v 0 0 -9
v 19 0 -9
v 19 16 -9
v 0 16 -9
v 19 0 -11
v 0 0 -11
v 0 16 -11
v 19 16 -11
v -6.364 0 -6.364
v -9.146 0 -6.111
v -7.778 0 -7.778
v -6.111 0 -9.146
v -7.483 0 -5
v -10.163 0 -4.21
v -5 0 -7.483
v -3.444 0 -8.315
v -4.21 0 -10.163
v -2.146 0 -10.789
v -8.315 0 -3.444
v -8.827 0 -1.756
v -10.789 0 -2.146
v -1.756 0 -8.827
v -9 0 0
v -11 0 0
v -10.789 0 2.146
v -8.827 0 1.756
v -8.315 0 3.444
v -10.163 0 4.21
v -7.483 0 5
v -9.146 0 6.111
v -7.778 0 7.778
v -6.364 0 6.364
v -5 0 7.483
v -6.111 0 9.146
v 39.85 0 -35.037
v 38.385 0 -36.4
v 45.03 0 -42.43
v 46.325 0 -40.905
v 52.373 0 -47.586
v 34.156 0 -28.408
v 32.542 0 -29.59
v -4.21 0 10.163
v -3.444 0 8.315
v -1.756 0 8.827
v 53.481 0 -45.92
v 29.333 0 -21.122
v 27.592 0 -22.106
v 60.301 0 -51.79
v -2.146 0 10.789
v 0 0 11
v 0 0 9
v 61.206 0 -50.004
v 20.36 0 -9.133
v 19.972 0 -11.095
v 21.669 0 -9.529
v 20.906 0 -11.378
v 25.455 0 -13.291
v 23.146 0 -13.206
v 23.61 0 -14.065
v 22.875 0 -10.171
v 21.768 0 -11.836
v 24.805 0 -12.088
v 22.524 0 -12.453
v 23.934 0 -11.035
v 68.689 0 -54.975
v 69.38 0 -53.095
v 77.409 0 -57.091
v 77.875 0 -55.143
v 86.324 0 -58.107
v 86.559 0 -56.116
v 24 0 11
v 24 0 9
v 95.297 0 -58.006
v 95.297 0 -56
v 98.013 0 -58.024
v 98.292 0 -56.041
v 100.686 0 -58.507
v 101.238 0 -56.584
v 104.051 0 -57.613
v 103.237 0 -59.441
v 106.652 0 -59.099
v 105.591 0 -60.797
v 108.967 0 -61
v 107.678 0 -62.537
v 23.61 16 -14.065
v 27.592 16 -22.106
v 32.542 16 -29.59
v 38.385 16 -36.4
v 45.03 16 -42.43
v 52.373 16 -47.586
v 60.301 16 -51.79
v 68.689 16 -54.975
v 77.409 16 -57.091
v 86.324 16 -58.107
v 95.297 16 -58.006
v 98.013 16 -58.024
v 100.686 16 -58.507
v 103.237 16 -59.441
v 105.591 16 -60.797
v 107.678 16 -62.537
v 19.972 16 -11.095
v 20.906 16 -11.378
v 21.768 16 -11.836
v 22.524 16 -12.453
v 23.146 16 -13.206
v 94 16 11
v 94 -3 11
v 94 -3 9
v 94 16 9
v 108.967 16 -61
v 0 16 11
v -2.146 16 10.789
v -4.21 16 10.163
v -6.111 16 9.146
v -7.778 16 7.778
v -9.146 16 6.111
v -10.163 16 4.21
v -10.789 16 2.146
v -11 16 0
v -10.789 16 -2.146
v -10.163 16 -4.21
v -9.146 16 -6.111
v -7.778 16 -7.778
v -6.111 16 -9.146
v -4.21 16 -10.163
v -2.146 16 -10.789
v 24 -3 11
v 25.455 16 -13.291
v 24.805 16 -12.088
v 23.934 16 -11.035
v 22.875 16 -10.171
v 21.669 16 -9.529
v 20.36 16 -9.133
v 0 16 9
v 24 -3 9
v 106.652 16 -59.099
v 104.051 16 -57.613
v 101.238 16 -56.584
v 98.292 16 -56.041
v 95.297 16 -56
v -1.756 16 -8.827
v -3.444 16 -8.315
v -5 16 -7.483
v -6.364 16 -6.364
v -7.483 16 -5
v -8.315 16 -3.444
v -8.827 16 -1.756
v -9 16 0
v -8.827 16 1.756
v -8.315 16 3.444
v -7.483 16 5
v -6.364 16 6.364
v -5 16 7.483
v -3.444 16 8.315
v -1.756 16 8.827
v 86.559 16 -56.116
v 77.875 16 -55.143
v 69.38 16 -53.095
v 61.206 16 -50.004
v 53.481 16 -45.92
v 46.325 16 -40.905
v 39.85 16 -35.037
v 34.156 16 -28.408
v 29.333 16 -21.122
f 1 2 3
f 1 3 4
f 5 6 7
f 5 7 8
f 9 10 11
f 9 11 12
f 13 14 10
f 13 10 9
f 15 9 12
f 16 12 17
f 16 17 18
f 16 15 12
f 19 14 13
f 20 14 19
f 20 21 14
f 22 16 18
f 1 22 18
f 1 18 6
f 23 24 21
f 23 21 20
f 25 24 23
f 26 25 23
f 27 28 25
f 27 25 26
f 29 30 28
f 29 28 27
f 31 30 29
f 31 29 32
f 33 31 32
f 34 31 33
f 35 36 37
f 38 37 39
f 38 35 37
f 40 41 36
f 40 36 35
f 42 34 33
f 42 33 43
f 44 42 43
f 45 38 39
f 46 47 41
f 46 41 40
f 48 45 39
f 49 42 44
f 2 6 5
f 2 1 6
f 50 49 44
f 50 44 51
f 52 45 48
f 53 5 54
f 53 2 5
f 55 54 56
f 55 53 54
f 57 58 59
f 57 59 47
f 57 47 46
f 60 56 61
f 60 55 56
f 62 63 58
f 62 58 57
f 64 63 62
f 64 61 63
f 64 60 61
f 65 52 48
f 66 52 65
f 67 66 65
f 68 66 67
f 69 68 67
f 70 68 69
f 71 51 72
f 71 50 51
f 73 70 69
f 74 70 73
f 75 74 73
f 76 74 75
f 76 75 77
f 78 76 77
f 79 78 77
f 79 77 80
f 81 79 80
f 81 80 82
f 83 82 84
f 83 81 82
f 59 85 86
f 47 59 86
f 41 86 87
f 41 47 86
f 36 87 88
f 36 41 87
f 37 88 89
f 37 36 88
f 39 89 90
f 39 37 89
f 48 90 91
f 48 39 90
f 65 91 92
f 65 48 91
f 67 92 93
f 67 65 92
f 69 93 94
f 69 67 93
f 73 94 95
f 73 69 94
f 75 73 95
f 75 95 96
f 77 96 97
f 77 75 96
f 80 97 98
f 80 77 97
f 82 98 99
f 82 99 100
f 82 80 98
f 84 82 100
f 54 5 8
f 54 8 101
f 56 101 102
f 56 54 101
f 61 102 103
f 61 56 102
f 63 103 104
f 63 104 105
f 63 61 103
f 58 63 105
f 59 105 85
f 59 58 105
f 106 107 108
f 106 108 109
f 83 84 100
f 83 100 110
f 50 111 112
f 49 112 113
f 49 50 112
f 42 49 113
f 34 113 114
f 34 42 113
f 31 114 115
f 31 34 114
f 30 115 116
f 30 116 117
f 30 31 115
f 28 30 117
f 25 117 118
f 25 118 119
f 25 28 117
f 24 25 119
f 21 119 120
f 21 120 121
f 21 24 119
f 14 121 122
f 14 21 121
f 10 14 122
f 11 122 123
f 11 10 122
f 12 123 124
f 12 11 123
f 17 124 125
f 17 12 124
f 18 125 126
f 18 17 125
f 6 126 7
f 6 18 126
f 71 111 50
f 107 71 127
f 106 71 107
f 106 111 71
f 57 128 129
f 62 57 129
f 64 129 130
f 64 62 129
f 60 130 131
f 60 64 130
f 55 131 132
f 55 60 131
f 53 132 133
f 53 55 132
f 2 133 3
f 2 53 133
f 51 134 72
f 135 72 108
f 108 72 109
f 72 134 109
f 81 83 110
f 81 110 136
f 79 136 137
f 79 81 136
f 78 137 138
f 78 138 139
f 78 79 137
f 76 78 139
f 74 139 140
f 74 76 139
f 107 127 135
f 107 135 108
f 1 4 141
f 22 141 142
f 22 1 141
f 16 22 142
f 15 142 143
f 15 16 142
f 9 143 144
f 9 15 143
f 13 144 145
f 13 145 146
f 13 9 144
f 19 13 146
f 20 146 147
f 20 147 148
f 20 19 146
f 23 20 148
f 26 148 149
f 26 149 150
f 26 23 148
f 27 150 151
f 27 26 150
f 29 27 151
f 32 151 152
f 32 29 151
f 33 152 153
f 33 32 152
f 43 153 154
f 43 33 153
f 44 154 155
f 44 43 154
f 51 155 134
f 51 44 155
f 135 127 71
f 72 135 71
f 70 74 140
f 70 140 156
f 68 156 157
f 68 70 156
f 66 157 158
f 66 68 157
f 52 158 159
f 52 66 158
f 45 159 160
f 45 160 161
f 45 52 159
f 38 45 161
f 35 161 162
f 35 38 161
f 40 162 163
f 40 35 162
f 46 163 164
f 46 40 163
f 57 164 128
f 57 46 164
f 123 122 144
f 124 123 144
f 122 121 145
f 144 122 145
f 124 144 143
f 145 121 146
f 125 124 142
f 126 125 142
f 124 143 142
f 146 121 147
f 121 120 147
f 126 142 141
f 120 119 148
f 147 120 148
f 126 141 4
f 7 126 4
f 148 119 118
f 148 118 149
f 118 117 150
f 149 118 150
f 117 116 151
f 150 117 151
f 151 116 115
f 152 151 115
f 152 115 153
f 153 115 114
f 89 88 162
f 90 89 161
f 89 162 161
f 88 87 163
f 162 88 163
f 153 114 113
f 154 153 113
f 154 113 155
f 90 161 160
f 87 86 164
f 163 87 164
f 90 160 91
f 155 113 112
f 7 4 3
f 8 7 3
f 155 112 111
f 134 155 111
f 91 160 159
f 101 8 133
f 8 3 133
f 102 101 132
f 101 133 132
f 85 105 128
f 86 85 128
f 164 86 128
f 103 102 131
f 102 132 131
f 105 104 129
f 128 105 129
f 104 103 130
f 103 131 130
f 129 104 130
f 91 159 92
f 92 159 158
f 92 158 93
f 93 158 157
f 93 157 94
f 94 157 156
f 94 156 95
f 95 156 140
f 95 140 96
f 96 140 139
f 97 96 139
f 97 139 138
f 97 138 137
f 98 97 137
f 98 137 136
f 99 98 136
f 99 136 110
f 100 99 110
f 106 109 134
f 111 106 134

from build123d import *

# Parameters (mm, degrees)
F1_DEPTH = 16
F2_W     = 70
F2_H     = 3
F3_DEPTH = 2


with BuildPart() as f1:
    # F0 (on Front) → F1 (new body)
    with BuildSketch(Plane.XZ):
        with BuildLine():
            Line((94, 11), (0, 11))
            ThreePointArc((0, 11), (-11, 0), (0, -11))
            Line((0, -11), (19, -11))
            ThreePointArc((19, -11), (21.768112, -11.836161), (23.61039, -14.064979))
            ThreePointArc((23.61039, -14.064979), (52.373093, -47.586467), (95.296574, -58.00559))
            ThreePointArc((95.296574, -58.00559), (101.981922, -58.918984), (107.67752, -62.536763))
            Line((107.67752, -62.536763), (108.967018, -61))
            ThreePointArc((108.967018, -61), (102.665945, -57.039589), (95.296574, -56))
            ThreePointArc((95.296574, -56), (53.4812, -45.919824), (25.454545, -13.29097))
            ThreePointArc((25.454545, -13.29097), (22.875357, -10.170626), (19, -9))
            Line((19, -9), (0, -9))
            ThreePointArc((0, -9), (-9, 0), (0, 9))
            Line((0, 9), (94, 9))
            Line((94, 9), (94, 11))
        make_face()
    extrude(amount=-F1_DEPTH)

    # F2 (on face) → F3 (join)
    with BuildSketch(Plane.XY.offset(11)):
        with Locations((59, -1.5)):
            Rectangle(F2_W, F2_H)
    extrude(amount=-F3_DEPTH)


solid = f1.part
